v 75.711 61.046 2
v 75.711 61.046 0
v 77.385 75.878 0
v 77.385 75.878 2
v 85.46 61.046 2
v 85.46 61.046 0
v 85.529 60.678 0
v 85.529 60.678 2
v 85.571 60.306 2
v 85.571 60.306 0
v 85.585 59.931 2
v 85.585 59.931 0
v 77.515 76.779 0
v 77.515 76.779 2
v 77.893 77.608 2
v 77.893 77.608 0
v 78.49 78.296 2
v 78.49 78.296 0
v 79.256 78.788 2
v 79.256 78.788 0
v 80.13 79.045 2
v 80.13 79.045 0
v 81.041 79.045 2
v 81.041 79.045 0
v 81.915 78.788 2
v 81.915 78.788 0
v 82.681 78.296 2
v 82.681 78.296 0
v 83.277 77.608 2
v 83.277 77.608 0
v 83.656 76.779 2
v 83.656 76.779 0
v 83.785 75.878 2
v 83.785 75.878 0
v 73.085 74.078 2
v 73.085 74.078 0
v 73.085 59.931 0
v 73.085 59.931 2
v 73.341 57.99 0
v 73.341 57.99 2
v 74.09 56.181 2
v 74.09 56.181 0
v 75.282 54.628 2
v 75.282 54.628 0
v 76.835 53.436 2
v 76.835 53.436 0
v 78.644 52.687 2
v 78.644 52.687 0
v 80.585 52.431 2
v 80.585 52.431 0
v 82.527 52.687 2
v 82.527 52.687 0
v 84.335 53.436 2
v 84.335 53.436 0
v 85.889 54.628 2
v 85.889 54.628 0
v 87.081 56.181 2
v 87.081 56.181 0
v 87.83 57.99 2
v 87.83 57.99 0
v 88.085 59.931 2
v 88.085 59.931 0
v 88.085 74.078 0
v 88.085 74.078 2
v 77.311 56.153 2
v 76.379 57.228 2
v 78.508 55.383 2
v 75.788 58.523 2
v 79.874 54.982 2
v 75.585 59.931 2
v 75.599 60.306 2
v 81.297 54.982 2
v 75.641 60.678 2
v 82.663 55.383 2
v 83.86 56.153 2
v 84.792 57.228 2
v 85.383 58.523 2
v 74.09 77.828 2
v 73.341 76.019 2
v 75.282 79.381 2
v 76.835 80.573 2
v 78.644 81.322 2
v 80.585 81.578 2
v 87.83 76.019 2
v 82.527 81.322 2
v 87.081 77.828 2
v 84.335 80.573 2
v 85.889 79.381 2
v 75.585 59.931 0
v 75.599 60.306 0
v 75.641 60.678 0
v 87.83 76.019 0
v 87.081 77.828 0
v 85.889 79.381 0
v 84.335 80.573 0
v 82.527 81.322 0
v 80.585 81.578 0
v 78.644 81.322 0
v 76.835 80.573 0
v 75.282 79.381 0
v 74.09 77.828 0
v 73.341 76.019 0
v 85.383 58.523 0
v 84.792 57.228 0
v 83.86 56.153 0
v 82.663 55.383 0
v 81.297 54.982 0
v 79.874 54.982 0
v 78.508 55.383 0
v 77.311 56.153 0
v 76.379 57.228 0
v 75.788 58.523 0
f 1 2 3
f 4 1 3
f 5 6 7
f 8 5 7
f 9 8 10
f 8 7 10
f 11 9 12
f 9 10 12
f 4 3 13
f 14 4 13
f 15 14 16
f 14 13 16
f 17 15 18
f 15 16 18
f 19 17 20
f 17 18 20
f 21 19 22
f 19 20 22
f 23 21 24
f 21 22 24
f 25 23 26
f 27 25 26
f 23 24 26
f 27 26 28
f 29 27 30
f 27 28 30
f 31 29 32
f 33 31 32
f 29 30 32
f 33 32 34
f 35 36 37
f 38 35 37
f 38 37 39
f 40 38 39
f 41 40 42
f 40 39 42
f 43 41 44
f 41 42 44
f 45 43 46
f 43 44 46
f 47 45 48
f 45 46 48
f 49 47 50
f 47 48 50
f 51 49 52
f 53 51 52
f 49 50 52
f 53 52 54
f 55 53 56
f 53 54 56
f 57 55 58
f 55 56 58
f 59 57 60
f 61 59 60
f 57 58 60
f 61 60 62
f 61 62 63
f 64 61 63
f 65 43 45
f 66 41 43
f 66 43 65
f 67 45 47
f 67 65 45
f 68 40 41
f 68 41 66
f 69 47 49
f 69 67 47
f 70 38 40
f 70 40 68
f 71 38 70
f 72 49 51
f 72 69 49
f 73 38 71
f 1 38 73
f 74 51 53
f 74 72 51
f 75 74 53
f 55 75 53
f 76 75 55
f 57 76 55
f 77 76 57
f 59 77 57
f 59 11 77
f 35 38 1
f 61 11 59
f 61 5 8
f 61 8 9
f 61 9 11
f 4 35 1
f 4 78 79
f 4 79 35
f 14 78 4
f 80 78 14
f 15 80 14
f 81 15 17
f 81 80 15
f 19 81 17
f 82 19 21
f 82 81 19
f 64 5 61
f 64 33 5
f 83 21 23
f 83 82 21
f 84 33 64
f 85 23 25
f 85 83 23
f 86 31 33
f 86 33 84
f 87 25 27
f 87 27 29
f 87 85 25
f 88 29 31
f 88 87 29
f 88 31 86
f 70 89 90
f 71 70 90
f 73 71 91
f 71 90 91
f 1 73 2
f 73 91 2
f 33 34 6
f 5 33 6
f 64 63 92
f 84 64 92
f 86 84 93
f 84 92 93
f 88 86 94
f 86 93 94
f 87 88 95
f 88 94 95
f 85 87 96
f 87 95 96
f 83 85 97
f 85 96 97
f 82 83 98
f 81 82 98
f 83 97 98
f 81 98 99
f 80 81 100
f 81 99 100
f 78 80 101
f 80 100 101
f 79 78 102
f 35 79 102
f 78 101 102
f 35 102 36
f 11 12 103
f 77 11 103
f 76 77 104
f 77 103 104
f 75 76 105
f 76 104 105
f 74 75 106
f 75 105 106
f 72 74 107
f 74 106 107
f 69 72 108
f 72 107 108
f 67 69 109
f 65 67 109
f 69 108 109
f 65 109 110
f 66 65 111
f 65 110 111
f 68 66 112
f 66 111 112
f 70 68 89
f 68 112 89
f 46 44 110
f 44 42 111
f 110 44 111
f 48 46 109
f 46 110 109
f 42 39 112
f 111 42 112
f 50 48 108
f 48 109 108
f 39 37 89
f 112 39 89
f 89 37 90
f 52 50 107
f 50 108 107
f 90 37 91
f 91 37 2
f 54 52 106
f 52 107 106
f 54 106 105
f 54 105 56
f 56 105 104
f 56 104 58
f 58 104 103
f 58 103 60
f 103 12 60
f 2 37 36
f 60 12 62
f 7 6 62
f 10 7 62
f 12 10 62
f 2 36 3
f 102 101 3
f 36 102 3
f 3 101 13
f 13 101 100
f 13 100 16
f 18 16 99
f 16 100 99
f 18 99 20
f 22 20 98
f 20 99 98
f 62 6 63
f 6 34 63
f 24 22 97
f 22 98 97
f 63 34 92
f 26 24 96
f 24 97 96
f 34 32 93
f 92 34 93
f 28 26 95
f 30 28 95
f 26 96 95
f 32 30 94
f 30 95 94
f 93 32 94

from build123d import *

# Parameters (mm, degrees)
BOSS_EXTRUDE1_DEPTH = 2


with BuildPart() as part:
    # Sketch1 → Boss-Extrude1 (new body)
    with BuildSketch(Plane.XY):
        with BuildLine():
            Line((73.085447554, 74.077647485), (73.085447554, 59.931475915))
            ThreePointArc((73.085447554, 59.931475915), (80.585447554, 52.431475915), (88.085447554, 59.931475915))
            Line((88.085447554, 59.931475915), (88.085447554, 74.077647485))
            ThreePointArc((88.085447554, 74.077647485), (80.585447554, 81.577647485), (73.085447554, 74.077647485))
        make_face()
        with BuildLine():
            Line((75.711262835, 61.046071504), (77.385447554, 75.877647485))
            ThreePointArc((77.385447554, 75.877647485), (80.585447554, 79.077647485), (83.785447554, 75.877647485))
            Line((83.785447554, 75.877647485), (85.459632273, 61.046071504))
            ThreePointArc((85.459632273, 61.046071504), (85.553894172, 60.492312971), (85.585447554, 59.931475915))
            ThreePointArc((85.585447554, 59.931475915), (80.585447554, 54.931475915), (75.585447554, 59.931475915))
            ThreePointArc((75.585447554, 59.931475915), (75.617000936, 60.492312971), (75.711262835, 61.046071504))
        make_face(mode=Mode.SUBTRACT)
    extrude(amount=BOSS_EXTRUDE1_DEPTH)


solid = part.part
